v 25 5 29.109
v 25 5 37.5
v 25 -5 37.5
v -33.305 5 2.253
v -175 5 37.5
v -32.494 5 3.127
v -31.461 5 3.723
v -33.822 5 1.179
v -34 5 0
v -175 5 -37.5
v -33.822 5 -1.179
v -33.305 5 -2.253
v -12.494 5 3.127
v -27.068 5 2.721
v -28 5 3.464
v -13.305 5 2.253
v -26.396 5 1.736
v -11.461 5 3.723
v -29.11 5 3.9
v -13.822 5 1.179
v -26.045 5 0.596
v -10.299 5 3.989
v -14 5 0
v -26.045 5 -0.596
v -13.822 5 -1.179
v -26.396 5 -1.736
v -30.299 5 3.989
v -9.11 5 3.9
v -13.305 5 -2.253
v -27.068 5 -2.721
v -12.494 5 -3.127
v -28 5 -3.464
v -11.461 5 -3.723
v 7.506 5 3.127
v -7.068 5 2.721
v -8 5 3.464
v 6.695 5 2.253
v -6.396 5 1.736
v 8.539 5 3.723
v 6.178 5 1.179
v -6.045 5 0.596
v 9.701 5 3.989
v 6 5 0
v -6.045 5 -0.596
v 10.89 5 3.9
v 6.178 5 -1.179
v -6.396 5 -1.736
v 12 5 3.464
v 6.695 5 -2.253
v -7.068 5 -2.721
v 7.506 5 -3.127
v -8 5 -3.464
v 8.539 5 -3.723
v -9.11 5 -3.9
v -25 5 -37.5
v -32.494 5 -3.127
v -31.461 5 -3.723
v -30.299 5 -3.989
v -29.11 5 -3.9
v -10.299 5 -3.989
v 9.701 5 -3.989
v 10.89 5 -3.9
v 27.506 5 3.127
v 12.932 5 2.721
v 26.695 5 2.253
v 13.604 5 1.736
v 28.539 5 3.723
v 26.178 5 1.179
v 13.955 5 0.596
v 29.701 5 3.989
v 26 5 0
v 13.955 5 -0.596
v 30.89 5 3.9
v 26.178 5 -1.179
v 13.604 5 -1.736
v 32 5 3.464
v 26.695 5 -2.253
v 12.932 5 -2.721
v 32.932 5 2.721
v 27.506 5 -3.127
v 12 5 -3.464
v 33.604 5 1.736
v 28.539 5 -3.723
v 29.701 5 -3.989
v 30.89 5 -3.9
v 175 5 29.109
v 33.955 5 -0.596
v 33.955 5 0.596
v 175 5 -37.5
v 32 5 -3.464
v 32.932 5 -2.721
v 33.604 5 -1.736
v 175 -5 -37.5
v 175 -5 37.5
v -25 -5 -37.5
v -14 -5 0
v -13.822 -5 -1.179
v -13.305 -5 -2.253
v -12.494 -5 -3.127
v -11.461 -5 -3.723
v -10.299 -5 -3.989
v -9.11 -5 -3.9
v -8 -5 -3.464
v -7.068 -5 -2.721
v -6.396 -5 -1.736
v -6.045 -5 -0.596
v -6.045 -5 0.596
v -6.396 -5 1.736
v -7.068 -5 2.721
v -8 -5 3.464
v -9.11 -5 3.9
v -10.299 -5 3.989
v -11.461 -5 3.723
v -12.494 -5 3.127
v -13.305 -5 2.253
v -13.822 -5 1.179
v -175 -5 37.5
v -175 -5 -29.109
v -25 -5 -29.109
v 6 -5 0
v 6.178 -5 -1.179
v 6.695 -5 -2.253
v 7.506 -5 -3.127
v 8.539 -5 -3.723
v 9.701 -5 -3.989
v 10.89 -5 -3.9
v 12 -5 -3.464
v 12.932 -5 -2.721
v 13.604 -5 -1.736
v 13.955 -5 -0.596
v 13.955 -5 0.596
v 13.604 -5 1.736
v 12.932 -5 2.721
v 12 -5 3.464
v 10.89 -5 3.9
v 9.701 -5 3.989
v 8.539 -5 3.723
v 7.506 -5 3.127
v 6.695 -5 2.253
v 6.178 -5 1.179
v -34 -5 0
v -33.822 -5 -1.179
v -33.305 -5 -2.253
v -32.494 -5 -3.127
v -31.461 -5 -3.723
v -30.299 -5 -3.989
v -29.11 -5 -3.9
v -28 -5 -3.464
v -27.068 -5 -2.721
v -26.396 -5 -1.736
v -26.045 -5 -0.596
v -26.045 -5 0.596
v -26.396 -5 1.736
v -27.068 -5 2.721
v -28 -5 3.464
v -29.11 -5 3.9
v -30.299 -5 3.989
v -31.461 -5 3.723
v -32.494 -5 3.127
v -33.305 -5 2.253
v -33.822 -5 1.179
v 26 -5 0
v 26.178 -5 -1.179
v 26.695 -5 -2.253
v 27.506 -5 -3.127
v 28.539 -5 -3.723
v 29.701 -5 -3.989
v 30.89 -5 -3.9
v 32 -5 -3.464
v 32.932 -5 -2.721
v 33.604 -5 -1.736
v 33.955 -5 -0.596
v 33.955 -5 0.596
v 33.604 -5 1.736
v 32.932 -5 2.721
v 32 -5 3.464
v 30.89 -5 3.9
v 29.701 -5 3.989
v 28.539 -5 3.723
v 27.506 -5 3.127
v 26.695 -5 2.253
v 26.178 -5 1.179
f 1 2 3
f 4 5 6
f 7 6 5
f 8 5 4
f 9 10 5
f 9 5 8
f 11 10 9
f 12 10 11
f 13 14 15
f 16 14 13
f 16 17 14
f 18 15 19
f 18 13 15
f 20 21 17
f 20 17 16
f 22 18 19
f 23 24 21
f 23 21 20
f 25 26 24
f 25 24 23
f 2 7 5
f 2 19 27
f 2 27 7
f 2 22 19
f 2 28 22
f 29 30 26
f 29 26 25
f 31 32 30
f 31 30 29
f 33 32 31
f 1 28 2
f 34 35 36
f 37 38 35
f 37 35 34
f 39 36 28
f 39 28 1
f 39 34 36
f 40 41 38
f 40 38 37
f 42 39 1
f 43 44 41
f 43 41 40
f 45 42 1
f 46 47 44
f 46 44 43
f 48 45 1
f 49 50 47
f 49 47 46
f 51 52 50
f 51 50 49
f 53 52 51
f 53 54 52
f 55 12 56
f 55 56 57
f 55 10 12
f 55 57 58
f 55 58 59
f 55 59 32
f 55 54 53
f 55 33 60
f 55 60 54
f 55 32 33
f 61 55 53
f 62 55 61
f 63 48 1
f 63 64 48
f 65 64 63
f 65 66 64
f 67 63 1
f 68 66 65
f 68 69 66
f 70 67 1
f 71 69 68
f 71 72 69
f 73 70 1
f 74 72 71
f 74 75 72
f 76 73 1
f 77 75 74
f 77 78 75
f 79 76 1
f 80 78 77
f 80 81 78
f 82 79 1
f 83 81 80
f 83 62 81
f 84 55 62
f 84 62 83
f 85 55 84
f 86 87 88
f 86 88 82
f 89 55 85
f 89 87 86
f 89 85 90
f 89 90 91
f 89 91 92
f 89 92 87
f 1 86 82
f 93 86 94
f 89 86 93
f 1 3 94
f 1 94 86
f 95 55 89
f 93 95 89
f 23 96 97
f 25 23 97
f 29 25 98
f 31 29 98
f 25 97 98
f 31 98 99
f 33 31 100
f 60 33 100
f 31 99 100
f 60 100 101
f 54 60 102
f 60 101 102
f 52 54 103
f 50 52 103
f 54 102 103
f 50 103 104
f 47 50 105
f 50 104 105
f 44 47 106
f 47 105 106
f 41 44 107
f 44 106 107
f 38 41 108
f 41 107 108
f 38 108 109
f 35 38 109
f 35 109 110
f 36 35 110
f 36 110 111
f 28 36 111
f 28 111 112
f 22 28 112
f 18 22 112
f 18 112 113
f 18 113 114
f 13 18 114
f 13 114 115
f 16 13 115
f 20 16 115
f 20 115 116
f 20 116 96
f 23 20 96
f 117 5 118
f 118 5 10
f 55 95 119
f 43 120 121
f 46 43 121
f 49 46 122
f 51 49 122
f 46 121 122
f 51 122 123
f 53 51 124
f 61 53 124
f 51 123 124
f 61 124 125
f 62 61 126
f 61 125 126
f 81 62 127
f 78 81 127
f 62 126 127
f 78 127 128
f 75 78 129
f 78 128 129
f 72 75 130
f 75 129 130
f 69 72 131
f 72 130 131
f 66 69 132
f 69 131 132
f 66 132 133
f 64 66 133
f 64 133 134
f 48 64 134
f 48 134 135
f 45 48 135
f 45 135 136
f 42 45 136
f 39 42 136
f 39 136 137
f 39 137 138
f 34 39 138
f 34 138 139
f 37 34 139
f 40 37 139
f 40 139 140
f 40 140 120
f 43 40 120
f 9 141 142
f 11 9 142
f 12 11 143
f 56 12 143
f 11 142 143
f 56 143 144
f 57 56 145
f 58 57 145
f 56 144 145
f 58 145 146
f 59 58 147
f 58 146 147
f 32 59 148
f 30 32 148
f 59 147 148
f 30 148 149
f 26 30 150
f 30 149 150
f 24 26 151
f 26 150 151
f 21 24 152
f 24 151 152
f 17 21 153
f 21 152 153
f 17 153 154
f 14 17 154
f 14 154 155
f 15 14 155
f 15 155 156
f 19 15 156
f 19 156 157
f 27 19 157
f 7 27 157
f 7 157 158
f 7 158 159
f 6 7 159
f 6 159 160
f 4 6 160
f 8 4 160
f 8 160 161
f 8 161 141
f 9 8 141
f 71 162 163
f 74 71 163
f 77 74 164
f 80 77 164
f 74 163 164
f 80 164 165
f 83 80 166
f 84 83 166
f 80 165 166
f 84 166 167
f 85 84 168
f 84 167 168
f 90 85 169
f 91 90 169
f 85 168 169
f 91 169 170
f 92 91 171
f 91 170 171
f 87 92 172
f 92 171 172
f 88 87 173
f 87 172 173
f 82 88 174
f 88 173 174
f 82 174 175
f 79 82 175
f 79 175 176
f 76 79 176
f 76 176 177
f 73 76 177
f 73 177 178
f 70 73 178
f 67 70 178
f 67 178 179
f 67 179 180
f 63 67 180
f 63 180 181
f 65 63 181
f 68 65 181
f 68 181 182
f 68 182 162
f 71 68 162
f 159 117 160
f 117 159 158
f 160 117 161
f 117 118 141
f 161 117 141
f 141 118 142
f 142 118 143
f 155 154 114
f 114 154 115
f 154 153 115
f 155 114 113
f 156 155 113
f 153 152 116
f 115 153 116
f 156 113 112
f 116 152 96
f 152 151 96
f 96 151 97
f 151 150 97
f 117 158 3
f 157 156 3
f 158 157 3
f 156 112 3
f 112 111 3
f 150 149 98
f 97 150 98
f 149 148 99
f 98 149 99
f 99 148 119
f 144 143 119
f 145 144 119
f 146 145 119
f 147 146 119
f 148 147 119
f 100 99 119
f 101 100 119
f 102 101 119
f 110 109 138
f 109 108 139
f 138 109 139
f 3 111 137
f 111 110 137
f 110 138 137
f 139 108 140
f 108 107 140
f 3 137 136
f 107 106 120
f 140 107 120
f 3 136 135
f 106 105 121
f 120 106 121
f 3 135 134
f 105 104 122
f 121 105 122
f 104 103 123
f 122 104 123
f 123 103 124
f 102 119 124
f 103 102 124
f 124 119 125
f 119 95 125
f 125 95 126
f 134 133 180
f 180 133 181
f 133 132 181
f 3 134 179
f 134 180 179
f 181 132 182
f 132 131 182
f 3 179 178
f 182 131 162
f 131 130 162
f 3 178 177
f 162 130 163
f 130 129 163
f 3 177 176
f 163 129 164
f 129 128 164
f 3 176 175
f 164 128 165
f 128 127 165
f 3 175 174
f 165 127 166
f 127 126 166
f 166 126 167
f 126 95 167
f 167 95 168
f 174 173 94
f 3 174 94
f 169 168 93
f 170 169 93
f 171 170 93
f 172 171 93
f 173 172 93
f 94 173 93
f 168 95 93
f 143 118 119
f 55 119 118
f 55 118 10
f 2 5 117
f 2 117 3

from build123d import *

# Parameters (mm, degrees)
SKETCH1_W             = 350
SKETCH1_H             = 75
BOSS_EXTRUDE2_DEPTH   = 5
F_8_0MM_DOWEL_HOLE1_D = 8
CUT_EXTRUDE3_DEPTH    = 150
CUT_EXTRUDE4_DEPTH    = 150


with BuildPart() as part:
    # Sketch1 → Boss-Extrude2 (new, symmetric)
    with BuildSketch(Plane(origin=(0, 0, 0), x_dir=(1, 0, 0), z_dir=(0, 1, 0))):
        Rectangle(SKETCH1_W, SKETCH1_H)
    extrude(amount=BOSS_EXTRUDE2_DEPTH, both=True)

    # Ø8.0mm Dowel Hole1 (through all)
    with Locations(Plane(origin=(0, 5, 0), x_dir=(1, 0, 0), z_dir=(0, 1, 0))):
        with Locations((10, 0), (30, 0), (-10, 0), (-30, 0)):
            Hole(F_8_0MM_DOWEL_HOLE1_D / 2)

    # Sketch10 → Cut-Extrude3 (cut)
    with BuildSketch(Plane(origin=(175, 0, 0), x_dir=(0, 0, -1), z_dir=(1, 0, 0))):
        Polygon((-37.5, 5), (-37.5, -5), (-29.109003688, 5), align=None)
    extrude(amount=-CUT_EXTRUDE3_DEPTH, mode=Mode.SUBTRACT)

    # Sketch11 → Cut-Extrude4 (cut)
    with BuildSketch(Plane.ZY.offset(175)):
        Polygon((-37.5, 5), (-37.5, -5), (-29.109003688, -5), align=None)
    extrude(amount=-CUT_EXTRUDE4_DEPTH, mode=Mode.SUBTRACT)


solid = part.part
